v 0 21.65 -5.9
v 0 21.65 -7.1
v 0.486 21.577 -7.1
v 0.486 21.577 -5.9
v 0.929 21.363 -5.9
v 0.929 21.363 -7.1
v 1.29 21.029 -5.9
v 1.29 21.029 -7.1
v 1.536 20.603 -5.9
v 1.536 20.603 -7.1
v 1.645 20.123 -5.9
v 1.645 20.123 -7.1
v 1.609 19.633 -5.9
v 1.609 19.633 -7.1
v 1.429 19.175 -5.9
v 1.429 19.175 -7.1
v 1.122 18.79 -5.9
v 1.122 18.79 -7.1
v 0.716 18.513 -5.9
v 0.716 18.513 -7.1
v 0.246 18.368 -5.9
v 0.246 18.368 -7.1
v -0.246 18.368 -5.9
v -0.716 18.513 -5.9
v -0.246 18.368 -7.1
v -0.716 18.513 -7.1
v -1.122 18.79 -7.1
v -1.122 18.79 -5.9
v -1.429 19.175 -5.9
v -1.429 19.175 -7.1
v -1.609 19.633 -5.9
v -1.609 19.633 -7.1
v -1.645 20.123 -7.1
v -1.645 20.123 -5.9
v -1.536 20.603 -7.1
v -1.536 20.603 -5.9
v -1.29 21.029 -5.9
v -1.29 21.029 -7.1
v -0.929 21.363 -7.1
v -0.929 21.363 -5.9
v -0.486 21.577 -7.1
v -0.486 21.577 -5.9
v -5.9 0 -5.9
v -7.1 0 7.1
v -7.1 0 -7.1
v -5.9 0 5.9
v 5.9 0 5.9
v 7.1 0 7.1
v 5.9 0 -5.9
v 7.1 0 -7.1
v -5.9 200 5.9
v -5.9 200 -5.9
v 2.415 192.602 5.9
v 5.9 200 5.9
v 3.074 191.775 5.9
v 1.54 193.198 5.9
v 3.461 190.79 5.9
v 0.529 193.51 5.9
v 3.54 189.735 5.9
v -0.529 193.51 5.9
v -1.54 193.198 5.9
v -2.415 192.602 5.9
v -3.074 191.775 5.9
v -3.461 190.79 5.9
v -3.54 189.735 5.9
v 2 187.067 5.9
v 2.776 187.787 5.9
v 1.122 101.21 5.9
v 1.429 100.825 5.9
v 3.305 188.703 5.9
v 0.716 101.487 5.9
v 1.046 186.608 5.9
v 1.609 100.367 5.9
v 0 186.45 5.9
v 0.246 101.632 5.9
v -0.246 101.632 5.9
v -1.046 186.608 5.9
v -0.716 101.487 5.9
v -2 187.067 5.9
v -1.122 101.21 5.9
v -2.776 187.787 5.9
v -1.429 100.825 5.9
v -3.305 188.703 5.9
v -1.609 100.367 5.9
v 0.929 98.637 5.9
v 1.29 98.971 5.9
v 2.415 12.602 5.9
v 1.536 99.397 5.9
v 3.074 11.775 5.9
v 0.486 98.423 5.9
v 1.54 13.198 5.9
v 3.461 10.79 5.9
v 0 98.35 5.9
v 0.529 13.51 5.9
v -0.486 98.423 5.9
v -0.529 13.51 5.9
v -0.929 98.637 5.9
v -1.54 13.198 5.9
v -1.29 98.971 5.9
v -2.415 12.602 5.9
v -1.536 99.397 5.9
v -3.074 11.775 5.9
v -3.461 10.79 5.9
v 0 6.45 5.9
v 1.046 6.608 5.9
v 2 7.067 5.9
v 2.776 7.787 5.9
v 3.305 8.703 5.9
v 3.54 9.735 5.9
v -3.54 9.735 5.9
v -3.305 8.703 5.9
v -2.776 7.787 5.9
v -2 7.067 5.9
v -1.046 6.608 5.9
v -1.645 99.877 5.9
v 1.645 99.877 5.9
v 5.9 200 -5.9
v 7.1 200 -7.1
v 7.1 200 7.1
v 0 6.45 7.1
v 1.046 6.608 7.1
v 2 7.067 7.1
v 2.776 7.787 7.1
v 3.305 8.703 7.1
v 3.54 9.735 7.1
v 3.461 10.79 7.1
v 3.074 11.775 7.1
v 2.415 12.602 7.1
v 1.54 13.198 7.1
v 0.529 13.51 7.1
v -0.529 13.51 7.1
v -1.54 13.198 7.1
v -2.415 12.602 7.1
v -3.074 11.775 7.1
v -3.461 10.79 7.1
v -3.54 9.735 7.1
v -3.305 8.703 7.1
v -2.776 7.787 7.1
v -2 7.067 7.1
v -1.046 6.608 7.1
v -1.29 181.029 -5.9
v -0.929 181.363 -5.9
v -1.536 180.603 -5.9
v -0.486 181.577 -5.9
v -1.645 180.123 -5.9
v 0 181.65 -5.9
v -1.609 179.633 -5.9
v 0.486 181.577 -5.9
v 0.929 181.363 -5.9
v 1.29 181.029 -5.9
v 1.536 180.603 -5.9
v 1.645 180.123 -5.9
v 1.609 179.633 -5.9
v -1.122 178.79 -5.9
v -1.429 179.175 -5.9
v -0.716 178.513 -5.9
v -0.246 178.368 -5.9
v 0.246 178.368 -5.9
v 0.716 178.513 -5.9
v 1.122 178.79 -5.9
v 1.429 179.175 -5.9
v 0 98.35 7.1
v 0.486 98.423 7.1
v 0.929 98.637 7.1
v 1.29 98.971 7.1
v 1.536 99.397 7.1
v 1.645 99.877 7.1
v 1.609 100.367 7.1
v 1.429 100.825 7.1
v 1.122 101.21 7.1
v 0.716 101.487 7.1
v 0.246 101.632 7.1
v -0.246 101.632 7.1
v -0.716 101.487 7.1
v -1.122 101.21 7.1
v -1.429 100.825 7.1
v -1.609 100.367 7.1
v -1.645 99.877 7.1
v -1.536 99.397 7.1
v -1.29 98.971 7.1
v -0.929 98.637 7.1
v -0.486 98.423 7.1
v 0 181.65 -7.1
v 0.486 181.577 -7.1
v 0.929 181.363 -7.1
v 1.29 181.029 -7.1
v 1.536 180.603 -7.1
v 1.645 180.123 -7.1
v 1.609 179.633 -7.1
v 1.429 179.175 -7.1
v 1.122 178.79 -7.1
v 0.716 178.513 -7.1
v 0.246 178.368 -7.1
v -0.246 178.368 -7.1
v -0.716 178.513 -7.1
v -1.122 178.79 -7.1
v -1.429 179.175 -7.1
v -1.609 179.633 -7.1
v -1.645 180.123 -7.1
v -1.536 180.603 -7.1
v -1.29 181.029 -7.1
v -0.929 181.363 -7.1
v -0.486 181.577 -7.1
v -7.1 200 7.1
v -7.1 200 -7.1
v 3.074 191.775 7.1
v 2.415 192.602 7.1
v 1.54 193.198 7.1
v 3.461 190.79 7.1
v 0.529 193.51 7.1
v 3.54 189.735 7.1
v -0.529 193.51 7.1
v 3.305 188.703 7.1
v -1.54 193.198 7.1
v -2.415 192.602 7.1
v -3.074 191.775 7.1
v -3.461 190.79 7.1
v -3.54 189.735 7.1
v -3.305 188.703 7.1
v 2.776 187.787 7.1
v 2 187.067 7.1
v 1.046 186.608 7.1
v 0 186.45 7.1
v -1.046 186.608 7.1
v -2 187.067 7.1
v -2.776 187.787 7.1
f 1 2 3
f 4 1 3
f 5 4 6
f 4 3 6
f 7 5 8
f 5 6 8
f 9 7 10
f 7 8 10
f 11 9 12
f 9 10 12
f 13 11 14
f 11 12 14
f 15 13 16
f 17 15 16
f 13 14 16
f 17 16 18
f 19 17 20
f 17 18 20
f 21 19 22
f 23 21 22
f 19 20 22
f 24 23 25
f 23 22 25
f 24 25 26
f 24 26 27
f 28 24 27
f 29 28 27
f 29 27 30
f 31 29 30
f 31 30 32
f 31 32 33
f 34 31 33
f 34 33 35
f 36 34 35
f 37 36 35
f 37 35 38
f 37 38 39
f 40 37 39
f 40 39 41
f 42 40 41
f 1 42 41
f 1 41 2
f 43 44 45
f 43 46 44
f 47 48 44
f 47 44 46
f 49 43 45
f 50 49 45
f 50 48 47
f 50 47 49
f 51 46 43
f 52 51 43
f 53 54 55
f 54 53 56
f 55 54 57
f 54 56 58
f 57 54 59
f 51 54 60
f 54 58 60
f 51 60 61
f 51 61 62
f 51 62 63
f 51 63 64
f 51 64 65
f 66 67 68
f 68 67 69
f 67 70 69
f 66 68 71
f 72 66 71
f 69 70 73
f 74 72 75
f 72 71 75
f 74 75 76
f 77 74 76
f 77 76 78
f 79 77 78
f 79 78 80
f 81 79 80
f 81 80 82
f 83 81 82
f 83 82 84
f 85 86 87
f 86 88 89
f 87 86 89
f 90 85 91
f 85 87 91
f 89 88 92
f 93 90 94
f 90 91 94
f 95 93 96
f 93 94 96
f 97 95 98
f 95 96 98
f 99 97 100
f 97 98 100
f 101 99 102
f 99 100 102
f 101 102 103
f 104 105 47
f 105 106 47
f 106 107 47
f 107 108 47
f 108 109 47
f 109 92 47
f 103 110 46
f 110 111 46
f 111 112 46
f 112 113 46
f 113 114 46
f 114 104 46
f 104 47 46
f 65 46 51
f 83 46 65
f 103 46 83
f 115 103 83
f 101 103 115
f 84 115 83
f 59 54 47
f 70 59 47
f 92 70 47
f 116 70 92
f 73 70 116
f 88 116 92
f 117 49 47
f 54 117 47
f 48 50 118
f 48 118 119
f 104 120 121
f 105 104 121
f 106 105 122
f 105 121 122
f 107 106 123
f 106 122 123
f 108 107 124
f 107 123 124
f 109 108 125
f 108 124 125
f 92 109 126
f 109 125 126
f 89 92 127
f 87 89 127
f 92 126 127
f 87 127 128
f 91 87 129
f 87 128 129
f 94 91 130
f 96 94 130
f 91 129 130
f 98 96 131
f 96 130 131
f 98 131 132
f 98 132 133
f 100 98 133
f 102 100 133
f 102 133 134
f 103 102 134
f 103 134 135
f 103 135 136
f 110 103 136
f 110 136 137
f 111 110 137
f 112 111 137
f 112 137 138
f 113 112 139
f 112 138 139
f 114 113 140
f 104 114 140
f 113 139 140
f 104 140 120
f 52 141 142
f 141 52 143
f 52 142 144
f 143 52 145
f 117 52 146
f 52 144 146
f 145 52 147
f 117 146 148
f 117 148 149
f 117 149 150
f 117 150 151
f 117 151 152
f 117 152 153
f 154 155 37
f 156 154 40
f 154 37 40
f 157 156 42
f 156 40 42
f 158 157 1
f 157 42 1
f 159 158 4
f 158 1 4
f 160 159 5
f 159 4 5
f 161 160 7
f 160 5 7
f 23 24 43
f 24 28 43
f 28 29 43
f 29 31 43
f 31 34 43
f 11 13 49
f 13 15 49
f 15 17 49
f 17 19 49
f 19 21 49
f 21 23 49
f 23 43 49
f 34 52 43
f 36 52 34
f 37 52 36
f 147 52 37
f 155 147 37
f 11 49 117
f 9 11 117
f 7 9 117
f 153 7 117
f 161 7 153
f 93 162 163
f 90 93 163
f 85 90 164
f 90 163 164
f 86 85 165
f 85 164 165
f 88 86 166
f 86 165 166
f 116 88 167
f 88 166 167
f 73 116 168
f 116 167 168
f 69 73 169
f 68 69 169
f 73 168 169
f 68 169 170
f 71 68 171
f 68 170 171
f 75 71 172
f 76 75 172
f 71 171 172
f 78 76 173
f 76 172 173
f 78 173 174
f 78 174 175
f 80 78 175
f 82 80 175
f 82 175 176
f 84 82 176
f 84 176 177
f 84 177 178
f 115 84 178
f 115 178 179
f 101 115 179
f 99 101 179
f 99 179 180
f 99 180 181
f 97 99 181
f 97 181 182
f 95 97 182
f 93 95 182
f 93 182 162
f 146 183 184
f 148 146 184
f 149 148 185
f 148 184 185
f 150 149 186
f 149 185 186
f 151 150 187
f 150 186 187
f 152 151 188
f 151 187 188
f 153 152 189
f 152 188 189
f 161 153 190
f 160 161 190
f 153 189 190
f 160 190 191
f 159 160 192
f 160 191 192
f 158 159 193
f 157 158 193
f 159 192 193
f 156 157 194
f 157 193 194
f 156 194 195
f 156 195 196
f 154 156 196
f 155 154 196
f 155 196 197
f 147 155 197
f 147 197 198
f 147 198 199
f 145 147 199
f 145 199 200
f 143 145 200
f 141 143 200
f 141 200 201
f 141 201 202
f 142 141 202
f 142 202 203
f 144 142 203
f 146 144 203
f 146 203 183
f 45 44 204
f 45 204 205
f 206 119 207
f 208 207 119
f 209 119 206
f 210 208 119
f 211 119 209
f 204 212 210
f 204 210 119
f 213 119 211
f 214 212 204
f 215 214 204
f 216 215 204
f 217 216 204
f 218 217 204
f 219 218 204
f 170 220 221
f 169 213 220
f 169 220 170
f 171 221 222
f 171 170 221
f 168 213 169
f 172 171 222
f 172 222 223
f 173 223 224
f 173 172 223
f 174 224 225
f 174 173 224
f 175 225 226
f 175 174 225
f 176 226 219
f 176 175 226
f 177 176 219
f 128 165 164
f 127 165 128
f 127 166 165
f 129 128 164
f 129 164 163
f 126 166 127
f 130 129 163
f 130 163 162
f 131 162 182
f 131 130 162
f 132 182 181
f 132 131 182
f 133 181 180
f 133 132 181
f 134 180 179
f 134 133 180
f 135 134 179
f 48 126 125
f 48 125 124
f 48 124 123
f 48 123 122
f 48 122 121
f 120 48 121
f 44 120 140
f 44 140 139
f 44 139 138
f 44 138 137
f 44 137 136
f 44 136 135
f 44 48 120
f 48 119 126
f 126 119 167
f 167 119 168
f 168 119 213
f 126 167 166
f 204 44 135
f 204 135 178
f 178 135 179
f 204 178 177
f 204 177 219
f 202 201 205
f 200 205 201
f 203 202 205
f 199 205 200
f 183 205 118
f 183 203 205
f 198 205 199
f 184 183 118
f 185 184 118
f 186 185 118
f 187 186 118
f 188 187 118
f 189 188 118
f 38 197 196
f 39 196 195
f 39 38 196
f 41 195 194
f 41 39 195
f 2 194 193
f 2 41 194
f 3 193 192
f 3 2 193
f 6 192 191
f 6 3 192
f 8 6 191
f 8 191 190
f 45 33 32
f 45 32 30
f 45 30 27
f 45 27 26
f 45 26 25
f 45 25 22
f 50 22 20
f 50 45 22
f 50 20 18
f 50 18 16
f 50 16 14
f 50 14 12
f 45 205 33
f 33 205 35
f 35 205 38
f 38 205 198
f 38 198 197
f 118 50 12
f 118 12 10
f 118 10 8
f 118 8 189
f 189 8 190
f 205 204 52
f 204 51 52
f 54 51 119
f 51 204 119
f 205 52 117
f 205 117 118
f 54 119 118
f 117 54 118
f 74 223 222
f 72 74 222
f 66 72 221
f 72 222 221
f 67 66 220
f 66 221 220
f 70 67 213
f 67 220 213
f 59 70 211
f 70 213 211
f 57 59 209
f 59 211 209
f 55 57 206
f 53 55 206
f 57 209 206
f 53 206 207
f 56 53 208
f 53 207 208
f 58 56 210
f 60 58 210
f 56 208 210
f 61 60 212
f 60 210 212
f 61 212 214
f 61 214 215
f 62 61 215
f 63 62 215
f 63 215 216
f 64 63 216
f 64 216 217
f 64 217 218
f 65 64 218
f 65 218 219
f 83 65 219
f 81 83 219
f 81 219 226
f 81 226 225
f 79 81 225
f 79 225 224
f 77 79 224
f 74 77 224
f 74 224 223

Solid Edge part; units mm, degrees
sketch "Sketch1" plane through (0, 0, 0) normal (0, -1, 0) x (1, 0, 0)
  line L0 (-7.1, -7.1) -> (7.1, -7.1)
  line L1 (7.1, -7.1) -> (7.1, 7.1)
  line L2 (7.1, 7.1) -> (-7.1, 7.1)
  line L3 (-7.1, 7.1) -> (-7.1, -7.1)
  line L4 (-5.9, -5.9) -> (5.9, -5.9)
  line L5 (5.9, -5.9) -> (5.9, 5.9)
  line L6 (5.9, 5.9) -> (-5.9, 5.9)
  line L7 (-5.9, 5.9) -> (-5.9, -5.9)
extrude "Extrusionsausprägung_1" add sketch "Sketch1" against normal blind 200
hole "Bohrung_1" at (0, 100, 7.1) direction (0, 0, -1) diameter 3.3 end up to next
hole "Hole1" at (0, 10, 7.1) direction (0, 0, -1) diameter 3.3 end up to next
hole "Hole2" at (0, 190, 7.1) direction (0, 0, -1) diameter 3.3 end up to next
hole "Bohrung_4" at (0, 10, 7.1) direction (0, 0, -1) diameter 7.1 end up to next
hole "Hole3" at (0, 190, 7.1) direction (0, 0, -1) diameter 7.1 end up to next
hole "Bohrung_8" at (0, 20, -7.1) direction (0, 0, 1) diameter 3.3 end up to next
hole "Hole4" at (0, 180, -7.1) direction (0, 0, 1) diameter 3.3 end up to next
properties material "Aluminium, 2024-T4"
